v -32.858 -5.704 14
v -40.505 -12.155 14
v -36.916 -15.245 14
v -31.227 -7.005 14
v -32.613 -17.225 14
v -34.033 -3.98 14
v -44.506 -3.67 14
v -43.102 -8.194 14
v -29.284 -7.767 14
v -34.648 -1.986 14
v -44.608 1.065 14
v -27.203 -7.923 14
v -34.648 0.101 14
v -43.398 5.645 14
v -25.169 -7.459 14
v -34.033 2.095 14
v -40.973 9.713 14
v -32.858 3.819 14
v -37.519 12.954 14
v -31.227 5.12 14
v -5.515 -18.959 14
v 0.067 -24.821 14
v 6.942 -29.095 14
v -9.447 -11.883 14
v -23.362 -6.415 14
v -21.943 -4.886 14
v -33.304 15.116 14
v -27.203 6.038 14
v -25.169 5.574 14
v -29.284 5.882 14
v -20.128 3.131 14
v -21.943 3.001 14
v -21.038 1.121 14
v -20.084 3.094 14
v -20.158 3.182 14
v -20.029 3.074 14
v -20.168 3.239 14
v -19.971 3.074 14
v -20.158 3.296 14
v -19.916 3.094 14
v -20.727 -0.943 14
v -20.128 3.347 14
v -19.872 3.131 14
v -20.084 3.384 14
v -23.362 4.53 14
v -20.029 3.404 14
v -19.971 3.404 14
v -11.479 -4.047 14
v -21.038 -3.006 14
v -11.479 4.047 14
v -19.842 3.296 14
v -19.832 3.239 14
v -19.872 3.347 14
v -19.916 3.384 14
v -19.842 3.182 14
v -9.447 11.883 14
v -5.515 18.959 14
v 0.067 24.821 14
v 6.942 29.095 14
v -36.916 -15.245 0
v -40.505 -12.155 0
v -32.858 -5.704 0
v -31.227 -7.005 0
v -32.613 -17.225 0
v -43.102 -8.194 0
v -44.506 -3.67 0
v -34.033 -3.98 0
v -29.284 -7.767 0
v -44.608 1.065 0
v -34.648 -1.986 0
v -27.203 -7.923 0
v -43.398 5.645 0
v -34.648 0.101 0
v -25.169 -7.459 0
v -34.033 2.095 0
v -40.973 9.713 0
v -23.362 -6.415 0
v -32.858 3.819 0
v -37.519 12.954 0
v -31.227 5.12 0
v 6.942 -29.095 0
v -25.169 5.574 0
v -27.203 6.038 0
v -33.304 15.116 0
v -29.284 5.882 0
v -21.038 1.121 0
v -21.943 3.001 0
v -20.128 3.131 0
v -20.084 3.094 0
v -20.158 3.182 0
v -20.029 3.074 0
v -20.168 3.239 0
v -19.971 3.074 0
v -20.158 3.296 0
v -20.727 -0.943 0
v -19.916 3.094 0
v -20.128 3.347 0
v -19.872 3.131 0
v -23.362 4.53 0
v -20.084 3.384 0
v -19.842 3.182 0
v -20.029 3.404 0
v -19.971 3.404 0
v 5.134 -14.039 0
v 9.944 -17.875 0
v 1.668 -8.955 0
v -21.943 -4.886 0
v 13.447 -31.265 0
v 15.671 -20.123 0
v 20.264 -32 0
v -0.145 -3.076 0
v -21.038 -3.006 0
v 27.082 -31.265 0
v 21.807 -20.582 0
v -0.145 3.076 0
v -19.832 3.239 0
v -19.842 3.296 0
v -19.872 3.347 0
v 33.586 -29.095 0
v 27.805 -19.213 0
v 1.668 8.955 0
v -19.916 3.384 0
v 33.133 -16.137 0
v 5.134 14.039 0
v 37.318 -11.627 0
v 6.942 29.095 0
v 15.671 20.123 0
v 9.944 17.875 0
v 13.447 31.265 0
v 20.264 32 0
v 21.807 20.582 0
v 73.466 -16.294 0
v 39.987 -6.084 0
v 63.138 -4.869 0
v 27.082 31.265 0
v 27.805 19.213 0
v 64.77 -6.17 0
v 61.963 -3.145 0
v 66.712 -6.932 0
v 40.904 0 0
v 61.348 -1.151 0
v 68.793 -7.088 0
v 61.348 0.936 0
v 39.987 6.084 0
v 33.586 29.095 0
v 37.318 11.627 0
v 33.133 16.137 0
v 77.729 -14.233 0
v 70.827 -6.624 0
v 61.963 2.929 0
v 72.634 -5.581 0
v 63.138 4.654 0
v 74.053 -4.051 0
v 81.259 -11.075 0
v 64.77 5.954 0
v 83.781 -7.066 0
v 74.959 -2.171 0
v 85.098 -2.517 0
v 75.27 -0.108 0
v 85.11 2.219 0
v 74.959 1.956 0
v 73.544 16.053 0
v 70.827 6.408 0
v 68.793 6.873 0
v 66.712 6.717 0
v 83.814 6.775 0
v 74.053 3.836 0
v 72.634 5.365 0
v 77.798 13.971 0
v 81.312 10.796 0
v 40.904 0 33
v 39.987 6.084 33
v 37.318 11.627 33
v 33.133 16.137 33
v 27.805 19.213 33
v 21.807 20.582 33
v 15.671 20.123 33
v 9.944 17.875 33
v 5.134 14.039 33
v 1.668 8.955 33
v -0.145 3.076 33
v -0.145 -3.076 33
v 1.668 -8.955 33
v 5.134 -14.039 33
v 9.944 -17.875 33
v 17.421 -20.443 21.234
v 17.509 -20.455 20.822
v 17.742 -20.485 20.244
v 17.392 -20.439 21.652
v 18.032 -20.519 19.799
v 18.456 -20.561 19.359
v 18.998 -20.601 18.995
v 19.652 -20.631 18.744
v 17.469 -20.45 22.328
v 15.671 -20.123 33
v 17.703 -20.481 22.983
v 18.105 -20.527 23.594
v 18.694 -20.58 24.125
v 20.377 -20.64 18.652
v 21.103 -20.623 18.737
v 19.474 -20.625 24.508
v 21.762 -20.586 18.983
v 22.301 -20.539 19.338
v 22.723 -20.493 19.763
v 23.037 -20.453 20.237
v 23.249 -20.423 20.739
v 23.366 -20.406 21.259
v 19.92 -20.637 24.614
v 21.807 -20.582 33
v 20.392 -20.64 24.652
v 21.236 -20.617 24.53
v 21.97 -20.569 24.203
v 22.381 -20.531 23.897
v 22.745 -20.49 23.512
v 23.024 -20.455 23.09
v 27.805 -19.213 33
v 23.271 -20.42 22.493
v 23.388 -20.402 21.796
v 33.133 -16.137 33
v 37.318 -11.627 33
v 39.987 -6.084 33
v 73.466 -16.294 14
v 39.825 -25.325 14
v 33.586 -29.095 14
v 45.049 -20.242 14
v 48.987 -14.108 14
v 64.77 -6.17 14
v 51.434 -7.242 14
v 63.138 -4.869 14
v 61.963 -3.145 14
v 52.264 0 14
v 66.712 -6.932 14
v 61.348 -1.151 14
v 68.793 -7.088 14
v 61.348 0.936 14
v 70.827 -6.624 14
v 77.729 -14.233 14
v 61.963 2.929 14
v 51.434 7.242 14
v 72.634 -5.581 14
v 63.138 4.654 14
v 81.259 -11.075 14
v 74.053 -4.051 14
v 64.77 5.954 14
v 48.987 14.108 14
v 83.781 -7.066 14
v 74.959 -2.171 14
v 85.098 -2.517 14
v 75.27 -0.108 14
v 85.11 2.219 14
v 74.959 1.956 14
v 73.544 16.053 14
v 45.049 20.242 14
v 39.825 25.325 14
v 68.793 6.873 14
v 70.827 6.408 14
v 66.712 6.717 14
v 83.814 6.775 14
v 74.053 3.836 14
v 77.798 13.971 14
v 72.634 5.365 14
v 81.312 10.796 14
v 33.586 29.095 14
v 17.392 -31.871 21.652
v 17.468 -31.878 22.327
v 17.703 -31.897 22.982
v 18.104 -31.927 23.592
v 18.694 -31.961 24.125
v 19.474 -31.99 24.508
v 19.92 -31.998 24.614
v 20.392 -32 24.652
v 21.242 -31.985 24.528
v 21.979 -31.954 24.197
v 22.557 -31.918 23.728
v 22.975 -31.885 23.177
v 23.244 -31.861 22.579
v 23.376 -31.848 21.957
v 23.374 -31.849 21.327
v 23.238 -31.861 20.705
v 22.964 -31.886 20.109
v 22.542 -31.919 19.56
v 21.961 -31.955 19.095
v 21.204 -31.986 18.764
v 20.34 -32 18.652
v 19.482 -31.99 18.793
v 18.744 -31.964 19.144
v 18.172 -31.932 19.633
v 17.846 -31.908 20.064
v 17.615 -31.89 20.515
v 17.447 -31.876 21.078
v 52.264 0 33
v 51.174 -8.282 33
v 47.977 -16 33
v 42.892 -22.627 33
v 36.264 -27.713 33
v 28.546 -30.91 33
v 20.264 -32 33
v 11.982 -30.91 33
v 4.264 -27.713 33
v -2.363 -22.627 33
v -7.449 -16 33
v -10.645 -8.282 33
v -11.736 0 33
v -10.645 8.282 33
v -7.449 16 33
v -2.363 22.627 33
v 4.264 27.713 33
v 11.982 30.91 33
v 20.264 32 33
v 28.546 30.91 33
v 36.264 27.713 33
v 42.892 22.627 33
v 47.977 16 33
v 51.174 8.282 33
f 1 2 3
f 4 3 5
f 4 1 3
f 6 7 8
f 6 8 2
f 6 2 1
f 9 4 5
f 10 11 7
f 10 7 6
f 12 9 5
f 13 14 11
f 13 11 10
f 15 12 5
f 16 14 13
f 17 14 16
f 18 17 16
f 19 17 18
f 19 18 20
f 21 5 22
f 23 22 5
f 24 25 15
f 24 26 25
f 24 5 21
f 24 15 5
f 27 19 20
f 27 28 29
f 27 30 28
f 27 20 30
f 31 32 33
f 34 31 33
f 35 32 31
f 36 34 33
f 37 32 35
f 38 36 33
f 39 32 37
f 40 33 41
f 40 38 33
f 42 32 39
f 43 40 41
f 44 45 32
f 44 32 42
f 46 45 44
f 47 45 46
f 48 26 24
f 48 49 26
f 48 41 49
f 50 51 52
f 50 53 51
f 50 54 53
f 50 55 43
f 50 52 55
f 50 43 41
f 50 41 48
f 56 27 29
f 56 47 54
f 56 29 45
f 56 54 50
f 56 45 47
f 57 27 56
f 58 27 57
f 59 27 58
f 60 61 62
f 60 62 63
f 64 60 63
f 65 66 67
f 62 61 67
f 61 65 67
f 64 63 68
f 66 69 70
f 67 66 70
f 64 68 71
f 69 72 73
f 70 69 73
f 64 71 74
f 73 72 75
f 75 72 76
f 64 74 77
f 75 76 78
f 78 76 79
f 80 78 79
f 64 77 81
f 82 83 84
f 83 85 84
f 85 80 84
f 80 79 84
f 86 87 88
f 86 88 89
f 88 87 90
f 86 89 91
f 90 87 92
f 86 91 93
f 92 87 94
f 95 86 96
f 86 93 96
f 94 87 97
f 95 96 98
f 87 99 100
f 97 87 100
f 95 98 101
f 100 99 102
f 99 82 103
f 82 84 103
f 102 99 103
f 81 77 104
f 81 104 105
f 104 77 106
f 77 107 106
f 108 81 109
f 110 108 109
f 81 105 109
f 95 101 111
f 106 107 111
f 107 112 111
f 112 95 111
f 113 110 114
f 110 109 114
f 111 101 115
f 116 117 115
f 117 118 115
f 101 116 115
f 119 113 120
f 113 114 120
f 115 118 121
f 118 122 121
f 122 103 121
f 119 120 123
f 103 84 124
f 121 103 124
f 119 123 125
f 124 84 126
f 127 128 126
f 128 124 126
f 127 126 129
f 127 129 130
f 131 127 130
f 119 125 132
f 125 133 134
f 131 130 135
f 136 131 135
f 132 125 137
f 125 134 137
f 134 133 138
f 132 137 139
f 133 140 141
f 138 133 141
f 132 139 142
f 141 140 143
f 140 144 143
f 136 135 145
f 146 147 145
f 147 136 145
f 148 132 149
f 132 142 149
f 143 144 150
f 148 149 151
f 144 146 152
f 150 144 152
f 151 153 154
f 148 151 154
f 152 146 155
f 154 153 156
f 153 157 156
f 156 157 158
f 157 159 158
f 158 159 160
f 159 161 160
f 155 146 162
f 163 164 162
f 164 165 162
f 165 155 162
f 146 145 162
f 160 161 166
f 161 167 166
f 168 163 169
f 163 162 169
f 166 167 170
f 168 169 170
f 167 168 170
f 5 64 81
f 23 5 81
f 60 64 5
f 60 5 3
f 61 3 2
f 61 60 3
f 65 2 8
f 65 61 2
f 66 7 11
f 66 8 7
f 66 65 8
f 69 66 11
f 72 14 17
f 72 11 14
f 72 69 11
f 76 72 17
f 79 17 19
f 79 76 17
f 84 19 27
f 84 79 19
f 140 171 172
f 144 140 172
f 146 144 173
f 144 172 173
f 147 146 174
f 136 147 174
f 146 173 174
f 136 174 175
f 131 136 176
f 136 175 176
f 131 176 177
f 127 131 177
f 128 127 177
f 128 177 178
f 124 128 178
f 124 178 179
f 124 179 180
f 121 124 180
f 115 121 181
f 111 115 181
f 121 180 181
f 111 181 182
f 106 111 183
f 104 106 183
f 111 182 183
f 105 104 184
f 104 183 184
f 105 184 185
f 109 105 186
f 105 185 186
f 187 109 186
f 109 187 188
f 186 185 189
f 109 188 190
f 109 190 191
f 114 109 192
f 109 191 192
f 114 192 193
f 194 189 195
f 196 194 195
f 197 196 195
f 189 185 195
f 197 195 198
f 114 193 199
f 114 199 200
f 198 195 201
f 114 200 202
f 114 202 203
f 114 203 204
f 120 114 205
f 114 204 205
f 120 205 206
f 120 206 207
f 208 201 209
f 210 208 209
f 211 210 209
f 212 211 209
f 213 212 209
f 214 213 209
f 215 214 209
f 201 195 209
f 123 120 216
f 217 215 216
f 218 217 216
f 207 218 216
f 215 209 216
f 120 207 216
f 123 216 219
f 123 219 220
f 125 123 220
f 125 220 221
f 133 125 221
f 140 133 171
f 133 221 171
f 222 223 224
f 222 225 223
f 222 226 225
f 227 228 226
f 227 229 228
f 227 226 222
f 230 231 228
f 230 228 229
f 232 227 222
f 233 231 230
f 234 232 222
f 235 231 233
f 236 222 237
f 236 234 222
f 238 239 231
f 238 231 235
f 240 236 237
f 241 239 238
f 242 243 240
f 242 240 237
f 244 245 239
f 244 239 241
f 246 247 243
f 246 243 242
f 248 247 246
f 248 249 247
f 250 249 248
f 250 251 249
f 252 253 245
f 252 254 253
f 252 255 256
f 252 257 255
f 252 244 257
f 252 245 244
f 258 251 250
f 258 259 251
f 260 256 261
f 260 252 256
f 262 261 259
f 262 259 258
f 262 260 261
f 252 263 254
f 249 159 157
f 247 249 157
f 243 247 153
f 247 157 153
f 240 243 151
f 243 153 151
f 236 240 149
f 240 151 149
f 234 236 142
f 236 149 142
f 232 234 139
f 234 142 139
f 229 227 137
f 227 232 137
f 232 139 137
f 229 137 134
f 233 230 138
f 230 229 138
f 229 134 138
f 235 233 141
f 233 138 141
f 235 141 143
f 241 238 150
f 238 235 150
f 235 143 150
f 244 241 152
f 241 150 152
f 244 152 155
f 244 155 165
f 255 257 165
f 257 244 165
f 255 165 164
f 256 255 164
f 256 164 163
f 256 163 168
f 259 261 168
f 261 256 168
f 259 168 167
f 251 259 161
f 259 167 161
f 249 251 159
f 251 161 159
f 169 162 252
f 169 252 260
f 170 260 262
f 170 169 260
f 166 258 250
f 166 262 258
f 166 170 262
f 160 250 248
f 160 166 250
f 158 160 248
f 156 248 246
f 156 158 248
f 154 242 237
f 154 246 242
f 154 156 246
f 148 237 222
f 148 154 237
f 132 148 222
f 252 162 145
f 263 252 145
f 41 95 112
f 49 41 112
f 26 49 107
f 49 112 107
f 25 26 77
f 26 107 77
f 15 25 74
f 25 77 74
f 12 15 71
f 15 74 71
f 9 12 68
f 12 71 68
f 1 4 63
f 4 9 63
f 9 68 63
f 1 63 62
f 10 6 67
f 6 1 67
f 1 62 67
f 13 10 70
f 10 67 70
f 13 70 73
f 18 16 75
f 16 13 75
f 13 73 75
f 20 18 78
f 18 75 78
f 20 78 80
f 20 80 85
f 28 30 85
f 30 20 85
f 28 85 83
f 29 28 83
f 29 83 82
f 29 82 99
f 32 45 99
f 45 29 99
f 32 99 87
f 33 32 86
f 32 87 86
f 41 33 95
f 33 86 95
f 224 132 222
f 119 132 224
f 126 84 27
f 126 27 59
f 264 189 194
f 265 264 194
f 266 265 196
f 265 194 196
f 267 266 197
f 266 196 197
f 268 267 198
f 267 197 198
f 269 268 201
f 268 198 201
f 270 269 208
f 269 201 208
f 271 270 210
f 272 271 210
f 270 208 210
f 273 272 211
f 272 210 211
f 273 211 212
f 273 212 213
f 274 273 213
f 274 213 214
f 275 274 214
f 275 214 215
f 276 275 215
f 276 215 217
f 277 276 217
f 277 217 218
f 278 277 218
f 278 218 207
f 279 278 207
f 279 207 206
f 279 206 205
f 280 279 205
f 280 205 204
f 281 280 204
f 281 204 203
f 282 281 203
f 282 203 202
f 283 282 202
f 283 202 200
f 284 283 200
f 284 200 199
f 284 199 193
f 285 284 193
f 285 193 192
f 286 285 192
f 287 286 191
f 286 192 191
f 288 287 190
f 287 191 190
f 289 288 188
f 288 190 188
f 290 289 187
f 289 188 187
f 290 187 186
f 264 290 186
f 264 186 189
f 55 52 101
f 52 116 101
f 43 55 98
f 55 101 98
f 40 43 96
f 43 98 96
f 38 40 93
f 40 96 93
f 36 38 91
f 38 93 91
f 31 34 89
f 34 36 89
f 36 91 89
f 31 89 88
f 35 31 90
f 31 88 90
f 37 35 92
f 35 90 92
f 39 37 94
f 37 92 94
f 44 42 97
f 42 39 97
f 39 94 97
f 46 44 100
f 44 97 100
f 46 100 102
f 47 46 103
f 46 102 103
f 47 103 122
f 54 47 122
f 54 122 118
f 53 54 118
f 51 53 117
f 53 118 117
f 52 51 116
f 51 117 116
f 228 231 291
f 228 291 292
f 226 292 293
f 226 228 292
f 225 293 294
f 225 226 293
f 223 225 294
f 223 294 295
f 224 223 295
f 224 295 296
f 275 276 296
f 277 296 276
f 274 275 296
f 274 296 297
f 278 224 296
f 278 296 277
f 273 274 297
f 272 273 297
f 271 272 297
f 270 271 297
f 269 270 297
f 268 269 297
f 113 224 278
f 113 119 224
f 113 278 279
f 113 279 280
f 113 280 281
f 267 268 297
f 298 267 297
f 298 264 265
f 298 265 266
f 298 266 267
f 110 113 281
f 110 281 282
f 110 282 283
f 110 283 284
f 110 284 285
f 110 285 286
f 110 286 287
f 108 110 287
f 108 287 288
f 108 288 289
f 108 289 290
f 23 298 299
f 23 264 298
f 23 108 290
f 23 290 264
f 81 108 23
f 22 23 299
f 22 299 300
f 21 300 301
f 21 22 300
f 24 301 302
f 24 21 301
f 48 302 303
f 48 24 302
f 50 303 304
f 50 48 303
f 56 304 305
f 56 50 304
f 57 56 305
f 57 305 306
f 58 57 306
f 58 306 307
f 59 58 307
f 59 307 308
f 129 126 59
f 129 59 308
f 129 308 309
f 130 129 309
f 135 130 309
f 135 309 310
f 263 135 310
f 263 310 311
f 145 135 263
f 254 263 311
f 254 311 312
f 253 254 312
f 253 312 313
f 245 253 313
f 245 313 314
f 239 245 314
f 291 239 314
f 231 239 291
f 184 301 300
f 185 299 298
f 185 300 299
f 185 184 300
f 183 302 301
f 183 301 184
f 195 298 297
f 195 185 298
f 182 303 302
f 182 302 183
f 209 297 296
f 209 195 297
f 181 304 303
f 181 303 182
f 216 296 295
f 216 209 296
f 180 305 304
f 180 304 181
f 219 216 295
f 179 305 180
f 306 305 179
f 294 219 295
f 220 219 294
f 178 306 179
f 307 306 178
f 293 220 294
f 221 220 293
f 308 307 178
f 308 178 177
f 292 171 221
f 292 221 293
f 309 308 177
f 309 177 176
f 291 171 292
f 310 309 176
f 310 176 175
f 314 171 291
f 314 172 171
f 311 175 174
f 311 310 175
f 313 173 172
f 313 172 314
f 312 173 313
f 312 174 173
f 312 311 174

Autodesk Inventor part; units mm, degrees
ref_plane "YZ Plane" through (0, 0, 0) normal (1, 0, 0) x (0, 1, 0)
ref_plane "XZ Plane" through (0, 0, 0) normal (0, 1, 0) x (-1, 0, 0)
ref_plane "XY Plane" through (0, 0, 0) normal (0, 0, 1) x (1, 0, 0)
sketch "Boceto1" plane through (0, 0, 0) normal (0, 0, 1) x (1, 0, 0)
  circle A0 centre (-27.7266, -0.9426) radius 7
  circle A1 centre (-20, 3.239) radius 0.1677
  circle A2 centre (68.2698, -0.1077) radius 7
  arc A3 (73.4655, -16.2943) -> (73.5445, 16.0533) centre (68.2698, -0.1077) ccw
  circle A4 centre (20.2642, 0) radius 32
  line L0 (-33.3043, 15.1163) -> (6.9422, 29.0951)
  line L1 (73.5445, 16.0533) -> (33.5861, 29.0951)
  line L2 (-33.0105, -17.1059) -> (6.9422, -29.0951)
  line L3 (73.4655, -16.2943) -> (33.5861, -29.0951)
  arc A5 (-33.3043, 15.1163) -> (-32.6128, -17.2252) centre (-27.7266, -0.9426) ccw
  point P0 (0, 0)
  dimension "d0" = 14
  dimension "d2" = 14
  dimension "d3" = 96
  dimension "d5" = 34
  dimension "d6" = 64
  dimension "d7" = 48
extrude "Extrusión1" add sketch "Boceto1" along normal blind 14 contours L3 A4 L1 A3 | L2 A5 L0 A4
extrude "Extrusión3" add sketch "Boceto1" along normal blind 33 contours A4
sketch "Boceto4" plane through (20.2642, 0, 33) normal (0, 0, 1) x (1, 0, 0)
  circle A0 centre (0, 0) radius 20.64
  point P0 (-20.2642, 0)
  dimension "d21" = 41.28
extrude "Extrusión4" cut sketch "Boceto4" against normal through all
sketch "Boceto5" plane through (0, 0, 0) normal (0, 1, 0) x (-1, 0, 0)
  line L0 (-40.9042, 33) -> (0.3758, 33) projected
  line L1 (0.3758, 0) -> (-40.9042, 0) projected
  line L2 (-40.9042, 33) -> (0.3758, 33) projected
  line L3 (0.3758, 0) -> (-40.9042, 0) projected
  line L4 (-40.9042, 33) -> (0.3758, 33) projected
  line L5 (0.3758, 0) -> (-40.9042, 0) projected
  line L6 (-40.9042, 33) -> (0.3758, 33) projected
  line L7 (-20.3915, 34.6516) -> (-20.3915, 21.6516)
  line L8 (11.7358, 33) -> (-52.2642, 33) projected
  line L9 (-20.3915, 34.6516) -> (-7.3915, 34.6516) construction
  circle A0 centre (-20.3915, 21.6516) radius 3
  point P0 (0, 0)
  point P1 (-20.2642, 0)
  dimension "d24" = 13
  dimension "d25" = 90
  dimension "d26" = 6
extrude "Extrusión5" cut sketch "Boceto5" against normal blind 33
properties part number "Chumacera"
